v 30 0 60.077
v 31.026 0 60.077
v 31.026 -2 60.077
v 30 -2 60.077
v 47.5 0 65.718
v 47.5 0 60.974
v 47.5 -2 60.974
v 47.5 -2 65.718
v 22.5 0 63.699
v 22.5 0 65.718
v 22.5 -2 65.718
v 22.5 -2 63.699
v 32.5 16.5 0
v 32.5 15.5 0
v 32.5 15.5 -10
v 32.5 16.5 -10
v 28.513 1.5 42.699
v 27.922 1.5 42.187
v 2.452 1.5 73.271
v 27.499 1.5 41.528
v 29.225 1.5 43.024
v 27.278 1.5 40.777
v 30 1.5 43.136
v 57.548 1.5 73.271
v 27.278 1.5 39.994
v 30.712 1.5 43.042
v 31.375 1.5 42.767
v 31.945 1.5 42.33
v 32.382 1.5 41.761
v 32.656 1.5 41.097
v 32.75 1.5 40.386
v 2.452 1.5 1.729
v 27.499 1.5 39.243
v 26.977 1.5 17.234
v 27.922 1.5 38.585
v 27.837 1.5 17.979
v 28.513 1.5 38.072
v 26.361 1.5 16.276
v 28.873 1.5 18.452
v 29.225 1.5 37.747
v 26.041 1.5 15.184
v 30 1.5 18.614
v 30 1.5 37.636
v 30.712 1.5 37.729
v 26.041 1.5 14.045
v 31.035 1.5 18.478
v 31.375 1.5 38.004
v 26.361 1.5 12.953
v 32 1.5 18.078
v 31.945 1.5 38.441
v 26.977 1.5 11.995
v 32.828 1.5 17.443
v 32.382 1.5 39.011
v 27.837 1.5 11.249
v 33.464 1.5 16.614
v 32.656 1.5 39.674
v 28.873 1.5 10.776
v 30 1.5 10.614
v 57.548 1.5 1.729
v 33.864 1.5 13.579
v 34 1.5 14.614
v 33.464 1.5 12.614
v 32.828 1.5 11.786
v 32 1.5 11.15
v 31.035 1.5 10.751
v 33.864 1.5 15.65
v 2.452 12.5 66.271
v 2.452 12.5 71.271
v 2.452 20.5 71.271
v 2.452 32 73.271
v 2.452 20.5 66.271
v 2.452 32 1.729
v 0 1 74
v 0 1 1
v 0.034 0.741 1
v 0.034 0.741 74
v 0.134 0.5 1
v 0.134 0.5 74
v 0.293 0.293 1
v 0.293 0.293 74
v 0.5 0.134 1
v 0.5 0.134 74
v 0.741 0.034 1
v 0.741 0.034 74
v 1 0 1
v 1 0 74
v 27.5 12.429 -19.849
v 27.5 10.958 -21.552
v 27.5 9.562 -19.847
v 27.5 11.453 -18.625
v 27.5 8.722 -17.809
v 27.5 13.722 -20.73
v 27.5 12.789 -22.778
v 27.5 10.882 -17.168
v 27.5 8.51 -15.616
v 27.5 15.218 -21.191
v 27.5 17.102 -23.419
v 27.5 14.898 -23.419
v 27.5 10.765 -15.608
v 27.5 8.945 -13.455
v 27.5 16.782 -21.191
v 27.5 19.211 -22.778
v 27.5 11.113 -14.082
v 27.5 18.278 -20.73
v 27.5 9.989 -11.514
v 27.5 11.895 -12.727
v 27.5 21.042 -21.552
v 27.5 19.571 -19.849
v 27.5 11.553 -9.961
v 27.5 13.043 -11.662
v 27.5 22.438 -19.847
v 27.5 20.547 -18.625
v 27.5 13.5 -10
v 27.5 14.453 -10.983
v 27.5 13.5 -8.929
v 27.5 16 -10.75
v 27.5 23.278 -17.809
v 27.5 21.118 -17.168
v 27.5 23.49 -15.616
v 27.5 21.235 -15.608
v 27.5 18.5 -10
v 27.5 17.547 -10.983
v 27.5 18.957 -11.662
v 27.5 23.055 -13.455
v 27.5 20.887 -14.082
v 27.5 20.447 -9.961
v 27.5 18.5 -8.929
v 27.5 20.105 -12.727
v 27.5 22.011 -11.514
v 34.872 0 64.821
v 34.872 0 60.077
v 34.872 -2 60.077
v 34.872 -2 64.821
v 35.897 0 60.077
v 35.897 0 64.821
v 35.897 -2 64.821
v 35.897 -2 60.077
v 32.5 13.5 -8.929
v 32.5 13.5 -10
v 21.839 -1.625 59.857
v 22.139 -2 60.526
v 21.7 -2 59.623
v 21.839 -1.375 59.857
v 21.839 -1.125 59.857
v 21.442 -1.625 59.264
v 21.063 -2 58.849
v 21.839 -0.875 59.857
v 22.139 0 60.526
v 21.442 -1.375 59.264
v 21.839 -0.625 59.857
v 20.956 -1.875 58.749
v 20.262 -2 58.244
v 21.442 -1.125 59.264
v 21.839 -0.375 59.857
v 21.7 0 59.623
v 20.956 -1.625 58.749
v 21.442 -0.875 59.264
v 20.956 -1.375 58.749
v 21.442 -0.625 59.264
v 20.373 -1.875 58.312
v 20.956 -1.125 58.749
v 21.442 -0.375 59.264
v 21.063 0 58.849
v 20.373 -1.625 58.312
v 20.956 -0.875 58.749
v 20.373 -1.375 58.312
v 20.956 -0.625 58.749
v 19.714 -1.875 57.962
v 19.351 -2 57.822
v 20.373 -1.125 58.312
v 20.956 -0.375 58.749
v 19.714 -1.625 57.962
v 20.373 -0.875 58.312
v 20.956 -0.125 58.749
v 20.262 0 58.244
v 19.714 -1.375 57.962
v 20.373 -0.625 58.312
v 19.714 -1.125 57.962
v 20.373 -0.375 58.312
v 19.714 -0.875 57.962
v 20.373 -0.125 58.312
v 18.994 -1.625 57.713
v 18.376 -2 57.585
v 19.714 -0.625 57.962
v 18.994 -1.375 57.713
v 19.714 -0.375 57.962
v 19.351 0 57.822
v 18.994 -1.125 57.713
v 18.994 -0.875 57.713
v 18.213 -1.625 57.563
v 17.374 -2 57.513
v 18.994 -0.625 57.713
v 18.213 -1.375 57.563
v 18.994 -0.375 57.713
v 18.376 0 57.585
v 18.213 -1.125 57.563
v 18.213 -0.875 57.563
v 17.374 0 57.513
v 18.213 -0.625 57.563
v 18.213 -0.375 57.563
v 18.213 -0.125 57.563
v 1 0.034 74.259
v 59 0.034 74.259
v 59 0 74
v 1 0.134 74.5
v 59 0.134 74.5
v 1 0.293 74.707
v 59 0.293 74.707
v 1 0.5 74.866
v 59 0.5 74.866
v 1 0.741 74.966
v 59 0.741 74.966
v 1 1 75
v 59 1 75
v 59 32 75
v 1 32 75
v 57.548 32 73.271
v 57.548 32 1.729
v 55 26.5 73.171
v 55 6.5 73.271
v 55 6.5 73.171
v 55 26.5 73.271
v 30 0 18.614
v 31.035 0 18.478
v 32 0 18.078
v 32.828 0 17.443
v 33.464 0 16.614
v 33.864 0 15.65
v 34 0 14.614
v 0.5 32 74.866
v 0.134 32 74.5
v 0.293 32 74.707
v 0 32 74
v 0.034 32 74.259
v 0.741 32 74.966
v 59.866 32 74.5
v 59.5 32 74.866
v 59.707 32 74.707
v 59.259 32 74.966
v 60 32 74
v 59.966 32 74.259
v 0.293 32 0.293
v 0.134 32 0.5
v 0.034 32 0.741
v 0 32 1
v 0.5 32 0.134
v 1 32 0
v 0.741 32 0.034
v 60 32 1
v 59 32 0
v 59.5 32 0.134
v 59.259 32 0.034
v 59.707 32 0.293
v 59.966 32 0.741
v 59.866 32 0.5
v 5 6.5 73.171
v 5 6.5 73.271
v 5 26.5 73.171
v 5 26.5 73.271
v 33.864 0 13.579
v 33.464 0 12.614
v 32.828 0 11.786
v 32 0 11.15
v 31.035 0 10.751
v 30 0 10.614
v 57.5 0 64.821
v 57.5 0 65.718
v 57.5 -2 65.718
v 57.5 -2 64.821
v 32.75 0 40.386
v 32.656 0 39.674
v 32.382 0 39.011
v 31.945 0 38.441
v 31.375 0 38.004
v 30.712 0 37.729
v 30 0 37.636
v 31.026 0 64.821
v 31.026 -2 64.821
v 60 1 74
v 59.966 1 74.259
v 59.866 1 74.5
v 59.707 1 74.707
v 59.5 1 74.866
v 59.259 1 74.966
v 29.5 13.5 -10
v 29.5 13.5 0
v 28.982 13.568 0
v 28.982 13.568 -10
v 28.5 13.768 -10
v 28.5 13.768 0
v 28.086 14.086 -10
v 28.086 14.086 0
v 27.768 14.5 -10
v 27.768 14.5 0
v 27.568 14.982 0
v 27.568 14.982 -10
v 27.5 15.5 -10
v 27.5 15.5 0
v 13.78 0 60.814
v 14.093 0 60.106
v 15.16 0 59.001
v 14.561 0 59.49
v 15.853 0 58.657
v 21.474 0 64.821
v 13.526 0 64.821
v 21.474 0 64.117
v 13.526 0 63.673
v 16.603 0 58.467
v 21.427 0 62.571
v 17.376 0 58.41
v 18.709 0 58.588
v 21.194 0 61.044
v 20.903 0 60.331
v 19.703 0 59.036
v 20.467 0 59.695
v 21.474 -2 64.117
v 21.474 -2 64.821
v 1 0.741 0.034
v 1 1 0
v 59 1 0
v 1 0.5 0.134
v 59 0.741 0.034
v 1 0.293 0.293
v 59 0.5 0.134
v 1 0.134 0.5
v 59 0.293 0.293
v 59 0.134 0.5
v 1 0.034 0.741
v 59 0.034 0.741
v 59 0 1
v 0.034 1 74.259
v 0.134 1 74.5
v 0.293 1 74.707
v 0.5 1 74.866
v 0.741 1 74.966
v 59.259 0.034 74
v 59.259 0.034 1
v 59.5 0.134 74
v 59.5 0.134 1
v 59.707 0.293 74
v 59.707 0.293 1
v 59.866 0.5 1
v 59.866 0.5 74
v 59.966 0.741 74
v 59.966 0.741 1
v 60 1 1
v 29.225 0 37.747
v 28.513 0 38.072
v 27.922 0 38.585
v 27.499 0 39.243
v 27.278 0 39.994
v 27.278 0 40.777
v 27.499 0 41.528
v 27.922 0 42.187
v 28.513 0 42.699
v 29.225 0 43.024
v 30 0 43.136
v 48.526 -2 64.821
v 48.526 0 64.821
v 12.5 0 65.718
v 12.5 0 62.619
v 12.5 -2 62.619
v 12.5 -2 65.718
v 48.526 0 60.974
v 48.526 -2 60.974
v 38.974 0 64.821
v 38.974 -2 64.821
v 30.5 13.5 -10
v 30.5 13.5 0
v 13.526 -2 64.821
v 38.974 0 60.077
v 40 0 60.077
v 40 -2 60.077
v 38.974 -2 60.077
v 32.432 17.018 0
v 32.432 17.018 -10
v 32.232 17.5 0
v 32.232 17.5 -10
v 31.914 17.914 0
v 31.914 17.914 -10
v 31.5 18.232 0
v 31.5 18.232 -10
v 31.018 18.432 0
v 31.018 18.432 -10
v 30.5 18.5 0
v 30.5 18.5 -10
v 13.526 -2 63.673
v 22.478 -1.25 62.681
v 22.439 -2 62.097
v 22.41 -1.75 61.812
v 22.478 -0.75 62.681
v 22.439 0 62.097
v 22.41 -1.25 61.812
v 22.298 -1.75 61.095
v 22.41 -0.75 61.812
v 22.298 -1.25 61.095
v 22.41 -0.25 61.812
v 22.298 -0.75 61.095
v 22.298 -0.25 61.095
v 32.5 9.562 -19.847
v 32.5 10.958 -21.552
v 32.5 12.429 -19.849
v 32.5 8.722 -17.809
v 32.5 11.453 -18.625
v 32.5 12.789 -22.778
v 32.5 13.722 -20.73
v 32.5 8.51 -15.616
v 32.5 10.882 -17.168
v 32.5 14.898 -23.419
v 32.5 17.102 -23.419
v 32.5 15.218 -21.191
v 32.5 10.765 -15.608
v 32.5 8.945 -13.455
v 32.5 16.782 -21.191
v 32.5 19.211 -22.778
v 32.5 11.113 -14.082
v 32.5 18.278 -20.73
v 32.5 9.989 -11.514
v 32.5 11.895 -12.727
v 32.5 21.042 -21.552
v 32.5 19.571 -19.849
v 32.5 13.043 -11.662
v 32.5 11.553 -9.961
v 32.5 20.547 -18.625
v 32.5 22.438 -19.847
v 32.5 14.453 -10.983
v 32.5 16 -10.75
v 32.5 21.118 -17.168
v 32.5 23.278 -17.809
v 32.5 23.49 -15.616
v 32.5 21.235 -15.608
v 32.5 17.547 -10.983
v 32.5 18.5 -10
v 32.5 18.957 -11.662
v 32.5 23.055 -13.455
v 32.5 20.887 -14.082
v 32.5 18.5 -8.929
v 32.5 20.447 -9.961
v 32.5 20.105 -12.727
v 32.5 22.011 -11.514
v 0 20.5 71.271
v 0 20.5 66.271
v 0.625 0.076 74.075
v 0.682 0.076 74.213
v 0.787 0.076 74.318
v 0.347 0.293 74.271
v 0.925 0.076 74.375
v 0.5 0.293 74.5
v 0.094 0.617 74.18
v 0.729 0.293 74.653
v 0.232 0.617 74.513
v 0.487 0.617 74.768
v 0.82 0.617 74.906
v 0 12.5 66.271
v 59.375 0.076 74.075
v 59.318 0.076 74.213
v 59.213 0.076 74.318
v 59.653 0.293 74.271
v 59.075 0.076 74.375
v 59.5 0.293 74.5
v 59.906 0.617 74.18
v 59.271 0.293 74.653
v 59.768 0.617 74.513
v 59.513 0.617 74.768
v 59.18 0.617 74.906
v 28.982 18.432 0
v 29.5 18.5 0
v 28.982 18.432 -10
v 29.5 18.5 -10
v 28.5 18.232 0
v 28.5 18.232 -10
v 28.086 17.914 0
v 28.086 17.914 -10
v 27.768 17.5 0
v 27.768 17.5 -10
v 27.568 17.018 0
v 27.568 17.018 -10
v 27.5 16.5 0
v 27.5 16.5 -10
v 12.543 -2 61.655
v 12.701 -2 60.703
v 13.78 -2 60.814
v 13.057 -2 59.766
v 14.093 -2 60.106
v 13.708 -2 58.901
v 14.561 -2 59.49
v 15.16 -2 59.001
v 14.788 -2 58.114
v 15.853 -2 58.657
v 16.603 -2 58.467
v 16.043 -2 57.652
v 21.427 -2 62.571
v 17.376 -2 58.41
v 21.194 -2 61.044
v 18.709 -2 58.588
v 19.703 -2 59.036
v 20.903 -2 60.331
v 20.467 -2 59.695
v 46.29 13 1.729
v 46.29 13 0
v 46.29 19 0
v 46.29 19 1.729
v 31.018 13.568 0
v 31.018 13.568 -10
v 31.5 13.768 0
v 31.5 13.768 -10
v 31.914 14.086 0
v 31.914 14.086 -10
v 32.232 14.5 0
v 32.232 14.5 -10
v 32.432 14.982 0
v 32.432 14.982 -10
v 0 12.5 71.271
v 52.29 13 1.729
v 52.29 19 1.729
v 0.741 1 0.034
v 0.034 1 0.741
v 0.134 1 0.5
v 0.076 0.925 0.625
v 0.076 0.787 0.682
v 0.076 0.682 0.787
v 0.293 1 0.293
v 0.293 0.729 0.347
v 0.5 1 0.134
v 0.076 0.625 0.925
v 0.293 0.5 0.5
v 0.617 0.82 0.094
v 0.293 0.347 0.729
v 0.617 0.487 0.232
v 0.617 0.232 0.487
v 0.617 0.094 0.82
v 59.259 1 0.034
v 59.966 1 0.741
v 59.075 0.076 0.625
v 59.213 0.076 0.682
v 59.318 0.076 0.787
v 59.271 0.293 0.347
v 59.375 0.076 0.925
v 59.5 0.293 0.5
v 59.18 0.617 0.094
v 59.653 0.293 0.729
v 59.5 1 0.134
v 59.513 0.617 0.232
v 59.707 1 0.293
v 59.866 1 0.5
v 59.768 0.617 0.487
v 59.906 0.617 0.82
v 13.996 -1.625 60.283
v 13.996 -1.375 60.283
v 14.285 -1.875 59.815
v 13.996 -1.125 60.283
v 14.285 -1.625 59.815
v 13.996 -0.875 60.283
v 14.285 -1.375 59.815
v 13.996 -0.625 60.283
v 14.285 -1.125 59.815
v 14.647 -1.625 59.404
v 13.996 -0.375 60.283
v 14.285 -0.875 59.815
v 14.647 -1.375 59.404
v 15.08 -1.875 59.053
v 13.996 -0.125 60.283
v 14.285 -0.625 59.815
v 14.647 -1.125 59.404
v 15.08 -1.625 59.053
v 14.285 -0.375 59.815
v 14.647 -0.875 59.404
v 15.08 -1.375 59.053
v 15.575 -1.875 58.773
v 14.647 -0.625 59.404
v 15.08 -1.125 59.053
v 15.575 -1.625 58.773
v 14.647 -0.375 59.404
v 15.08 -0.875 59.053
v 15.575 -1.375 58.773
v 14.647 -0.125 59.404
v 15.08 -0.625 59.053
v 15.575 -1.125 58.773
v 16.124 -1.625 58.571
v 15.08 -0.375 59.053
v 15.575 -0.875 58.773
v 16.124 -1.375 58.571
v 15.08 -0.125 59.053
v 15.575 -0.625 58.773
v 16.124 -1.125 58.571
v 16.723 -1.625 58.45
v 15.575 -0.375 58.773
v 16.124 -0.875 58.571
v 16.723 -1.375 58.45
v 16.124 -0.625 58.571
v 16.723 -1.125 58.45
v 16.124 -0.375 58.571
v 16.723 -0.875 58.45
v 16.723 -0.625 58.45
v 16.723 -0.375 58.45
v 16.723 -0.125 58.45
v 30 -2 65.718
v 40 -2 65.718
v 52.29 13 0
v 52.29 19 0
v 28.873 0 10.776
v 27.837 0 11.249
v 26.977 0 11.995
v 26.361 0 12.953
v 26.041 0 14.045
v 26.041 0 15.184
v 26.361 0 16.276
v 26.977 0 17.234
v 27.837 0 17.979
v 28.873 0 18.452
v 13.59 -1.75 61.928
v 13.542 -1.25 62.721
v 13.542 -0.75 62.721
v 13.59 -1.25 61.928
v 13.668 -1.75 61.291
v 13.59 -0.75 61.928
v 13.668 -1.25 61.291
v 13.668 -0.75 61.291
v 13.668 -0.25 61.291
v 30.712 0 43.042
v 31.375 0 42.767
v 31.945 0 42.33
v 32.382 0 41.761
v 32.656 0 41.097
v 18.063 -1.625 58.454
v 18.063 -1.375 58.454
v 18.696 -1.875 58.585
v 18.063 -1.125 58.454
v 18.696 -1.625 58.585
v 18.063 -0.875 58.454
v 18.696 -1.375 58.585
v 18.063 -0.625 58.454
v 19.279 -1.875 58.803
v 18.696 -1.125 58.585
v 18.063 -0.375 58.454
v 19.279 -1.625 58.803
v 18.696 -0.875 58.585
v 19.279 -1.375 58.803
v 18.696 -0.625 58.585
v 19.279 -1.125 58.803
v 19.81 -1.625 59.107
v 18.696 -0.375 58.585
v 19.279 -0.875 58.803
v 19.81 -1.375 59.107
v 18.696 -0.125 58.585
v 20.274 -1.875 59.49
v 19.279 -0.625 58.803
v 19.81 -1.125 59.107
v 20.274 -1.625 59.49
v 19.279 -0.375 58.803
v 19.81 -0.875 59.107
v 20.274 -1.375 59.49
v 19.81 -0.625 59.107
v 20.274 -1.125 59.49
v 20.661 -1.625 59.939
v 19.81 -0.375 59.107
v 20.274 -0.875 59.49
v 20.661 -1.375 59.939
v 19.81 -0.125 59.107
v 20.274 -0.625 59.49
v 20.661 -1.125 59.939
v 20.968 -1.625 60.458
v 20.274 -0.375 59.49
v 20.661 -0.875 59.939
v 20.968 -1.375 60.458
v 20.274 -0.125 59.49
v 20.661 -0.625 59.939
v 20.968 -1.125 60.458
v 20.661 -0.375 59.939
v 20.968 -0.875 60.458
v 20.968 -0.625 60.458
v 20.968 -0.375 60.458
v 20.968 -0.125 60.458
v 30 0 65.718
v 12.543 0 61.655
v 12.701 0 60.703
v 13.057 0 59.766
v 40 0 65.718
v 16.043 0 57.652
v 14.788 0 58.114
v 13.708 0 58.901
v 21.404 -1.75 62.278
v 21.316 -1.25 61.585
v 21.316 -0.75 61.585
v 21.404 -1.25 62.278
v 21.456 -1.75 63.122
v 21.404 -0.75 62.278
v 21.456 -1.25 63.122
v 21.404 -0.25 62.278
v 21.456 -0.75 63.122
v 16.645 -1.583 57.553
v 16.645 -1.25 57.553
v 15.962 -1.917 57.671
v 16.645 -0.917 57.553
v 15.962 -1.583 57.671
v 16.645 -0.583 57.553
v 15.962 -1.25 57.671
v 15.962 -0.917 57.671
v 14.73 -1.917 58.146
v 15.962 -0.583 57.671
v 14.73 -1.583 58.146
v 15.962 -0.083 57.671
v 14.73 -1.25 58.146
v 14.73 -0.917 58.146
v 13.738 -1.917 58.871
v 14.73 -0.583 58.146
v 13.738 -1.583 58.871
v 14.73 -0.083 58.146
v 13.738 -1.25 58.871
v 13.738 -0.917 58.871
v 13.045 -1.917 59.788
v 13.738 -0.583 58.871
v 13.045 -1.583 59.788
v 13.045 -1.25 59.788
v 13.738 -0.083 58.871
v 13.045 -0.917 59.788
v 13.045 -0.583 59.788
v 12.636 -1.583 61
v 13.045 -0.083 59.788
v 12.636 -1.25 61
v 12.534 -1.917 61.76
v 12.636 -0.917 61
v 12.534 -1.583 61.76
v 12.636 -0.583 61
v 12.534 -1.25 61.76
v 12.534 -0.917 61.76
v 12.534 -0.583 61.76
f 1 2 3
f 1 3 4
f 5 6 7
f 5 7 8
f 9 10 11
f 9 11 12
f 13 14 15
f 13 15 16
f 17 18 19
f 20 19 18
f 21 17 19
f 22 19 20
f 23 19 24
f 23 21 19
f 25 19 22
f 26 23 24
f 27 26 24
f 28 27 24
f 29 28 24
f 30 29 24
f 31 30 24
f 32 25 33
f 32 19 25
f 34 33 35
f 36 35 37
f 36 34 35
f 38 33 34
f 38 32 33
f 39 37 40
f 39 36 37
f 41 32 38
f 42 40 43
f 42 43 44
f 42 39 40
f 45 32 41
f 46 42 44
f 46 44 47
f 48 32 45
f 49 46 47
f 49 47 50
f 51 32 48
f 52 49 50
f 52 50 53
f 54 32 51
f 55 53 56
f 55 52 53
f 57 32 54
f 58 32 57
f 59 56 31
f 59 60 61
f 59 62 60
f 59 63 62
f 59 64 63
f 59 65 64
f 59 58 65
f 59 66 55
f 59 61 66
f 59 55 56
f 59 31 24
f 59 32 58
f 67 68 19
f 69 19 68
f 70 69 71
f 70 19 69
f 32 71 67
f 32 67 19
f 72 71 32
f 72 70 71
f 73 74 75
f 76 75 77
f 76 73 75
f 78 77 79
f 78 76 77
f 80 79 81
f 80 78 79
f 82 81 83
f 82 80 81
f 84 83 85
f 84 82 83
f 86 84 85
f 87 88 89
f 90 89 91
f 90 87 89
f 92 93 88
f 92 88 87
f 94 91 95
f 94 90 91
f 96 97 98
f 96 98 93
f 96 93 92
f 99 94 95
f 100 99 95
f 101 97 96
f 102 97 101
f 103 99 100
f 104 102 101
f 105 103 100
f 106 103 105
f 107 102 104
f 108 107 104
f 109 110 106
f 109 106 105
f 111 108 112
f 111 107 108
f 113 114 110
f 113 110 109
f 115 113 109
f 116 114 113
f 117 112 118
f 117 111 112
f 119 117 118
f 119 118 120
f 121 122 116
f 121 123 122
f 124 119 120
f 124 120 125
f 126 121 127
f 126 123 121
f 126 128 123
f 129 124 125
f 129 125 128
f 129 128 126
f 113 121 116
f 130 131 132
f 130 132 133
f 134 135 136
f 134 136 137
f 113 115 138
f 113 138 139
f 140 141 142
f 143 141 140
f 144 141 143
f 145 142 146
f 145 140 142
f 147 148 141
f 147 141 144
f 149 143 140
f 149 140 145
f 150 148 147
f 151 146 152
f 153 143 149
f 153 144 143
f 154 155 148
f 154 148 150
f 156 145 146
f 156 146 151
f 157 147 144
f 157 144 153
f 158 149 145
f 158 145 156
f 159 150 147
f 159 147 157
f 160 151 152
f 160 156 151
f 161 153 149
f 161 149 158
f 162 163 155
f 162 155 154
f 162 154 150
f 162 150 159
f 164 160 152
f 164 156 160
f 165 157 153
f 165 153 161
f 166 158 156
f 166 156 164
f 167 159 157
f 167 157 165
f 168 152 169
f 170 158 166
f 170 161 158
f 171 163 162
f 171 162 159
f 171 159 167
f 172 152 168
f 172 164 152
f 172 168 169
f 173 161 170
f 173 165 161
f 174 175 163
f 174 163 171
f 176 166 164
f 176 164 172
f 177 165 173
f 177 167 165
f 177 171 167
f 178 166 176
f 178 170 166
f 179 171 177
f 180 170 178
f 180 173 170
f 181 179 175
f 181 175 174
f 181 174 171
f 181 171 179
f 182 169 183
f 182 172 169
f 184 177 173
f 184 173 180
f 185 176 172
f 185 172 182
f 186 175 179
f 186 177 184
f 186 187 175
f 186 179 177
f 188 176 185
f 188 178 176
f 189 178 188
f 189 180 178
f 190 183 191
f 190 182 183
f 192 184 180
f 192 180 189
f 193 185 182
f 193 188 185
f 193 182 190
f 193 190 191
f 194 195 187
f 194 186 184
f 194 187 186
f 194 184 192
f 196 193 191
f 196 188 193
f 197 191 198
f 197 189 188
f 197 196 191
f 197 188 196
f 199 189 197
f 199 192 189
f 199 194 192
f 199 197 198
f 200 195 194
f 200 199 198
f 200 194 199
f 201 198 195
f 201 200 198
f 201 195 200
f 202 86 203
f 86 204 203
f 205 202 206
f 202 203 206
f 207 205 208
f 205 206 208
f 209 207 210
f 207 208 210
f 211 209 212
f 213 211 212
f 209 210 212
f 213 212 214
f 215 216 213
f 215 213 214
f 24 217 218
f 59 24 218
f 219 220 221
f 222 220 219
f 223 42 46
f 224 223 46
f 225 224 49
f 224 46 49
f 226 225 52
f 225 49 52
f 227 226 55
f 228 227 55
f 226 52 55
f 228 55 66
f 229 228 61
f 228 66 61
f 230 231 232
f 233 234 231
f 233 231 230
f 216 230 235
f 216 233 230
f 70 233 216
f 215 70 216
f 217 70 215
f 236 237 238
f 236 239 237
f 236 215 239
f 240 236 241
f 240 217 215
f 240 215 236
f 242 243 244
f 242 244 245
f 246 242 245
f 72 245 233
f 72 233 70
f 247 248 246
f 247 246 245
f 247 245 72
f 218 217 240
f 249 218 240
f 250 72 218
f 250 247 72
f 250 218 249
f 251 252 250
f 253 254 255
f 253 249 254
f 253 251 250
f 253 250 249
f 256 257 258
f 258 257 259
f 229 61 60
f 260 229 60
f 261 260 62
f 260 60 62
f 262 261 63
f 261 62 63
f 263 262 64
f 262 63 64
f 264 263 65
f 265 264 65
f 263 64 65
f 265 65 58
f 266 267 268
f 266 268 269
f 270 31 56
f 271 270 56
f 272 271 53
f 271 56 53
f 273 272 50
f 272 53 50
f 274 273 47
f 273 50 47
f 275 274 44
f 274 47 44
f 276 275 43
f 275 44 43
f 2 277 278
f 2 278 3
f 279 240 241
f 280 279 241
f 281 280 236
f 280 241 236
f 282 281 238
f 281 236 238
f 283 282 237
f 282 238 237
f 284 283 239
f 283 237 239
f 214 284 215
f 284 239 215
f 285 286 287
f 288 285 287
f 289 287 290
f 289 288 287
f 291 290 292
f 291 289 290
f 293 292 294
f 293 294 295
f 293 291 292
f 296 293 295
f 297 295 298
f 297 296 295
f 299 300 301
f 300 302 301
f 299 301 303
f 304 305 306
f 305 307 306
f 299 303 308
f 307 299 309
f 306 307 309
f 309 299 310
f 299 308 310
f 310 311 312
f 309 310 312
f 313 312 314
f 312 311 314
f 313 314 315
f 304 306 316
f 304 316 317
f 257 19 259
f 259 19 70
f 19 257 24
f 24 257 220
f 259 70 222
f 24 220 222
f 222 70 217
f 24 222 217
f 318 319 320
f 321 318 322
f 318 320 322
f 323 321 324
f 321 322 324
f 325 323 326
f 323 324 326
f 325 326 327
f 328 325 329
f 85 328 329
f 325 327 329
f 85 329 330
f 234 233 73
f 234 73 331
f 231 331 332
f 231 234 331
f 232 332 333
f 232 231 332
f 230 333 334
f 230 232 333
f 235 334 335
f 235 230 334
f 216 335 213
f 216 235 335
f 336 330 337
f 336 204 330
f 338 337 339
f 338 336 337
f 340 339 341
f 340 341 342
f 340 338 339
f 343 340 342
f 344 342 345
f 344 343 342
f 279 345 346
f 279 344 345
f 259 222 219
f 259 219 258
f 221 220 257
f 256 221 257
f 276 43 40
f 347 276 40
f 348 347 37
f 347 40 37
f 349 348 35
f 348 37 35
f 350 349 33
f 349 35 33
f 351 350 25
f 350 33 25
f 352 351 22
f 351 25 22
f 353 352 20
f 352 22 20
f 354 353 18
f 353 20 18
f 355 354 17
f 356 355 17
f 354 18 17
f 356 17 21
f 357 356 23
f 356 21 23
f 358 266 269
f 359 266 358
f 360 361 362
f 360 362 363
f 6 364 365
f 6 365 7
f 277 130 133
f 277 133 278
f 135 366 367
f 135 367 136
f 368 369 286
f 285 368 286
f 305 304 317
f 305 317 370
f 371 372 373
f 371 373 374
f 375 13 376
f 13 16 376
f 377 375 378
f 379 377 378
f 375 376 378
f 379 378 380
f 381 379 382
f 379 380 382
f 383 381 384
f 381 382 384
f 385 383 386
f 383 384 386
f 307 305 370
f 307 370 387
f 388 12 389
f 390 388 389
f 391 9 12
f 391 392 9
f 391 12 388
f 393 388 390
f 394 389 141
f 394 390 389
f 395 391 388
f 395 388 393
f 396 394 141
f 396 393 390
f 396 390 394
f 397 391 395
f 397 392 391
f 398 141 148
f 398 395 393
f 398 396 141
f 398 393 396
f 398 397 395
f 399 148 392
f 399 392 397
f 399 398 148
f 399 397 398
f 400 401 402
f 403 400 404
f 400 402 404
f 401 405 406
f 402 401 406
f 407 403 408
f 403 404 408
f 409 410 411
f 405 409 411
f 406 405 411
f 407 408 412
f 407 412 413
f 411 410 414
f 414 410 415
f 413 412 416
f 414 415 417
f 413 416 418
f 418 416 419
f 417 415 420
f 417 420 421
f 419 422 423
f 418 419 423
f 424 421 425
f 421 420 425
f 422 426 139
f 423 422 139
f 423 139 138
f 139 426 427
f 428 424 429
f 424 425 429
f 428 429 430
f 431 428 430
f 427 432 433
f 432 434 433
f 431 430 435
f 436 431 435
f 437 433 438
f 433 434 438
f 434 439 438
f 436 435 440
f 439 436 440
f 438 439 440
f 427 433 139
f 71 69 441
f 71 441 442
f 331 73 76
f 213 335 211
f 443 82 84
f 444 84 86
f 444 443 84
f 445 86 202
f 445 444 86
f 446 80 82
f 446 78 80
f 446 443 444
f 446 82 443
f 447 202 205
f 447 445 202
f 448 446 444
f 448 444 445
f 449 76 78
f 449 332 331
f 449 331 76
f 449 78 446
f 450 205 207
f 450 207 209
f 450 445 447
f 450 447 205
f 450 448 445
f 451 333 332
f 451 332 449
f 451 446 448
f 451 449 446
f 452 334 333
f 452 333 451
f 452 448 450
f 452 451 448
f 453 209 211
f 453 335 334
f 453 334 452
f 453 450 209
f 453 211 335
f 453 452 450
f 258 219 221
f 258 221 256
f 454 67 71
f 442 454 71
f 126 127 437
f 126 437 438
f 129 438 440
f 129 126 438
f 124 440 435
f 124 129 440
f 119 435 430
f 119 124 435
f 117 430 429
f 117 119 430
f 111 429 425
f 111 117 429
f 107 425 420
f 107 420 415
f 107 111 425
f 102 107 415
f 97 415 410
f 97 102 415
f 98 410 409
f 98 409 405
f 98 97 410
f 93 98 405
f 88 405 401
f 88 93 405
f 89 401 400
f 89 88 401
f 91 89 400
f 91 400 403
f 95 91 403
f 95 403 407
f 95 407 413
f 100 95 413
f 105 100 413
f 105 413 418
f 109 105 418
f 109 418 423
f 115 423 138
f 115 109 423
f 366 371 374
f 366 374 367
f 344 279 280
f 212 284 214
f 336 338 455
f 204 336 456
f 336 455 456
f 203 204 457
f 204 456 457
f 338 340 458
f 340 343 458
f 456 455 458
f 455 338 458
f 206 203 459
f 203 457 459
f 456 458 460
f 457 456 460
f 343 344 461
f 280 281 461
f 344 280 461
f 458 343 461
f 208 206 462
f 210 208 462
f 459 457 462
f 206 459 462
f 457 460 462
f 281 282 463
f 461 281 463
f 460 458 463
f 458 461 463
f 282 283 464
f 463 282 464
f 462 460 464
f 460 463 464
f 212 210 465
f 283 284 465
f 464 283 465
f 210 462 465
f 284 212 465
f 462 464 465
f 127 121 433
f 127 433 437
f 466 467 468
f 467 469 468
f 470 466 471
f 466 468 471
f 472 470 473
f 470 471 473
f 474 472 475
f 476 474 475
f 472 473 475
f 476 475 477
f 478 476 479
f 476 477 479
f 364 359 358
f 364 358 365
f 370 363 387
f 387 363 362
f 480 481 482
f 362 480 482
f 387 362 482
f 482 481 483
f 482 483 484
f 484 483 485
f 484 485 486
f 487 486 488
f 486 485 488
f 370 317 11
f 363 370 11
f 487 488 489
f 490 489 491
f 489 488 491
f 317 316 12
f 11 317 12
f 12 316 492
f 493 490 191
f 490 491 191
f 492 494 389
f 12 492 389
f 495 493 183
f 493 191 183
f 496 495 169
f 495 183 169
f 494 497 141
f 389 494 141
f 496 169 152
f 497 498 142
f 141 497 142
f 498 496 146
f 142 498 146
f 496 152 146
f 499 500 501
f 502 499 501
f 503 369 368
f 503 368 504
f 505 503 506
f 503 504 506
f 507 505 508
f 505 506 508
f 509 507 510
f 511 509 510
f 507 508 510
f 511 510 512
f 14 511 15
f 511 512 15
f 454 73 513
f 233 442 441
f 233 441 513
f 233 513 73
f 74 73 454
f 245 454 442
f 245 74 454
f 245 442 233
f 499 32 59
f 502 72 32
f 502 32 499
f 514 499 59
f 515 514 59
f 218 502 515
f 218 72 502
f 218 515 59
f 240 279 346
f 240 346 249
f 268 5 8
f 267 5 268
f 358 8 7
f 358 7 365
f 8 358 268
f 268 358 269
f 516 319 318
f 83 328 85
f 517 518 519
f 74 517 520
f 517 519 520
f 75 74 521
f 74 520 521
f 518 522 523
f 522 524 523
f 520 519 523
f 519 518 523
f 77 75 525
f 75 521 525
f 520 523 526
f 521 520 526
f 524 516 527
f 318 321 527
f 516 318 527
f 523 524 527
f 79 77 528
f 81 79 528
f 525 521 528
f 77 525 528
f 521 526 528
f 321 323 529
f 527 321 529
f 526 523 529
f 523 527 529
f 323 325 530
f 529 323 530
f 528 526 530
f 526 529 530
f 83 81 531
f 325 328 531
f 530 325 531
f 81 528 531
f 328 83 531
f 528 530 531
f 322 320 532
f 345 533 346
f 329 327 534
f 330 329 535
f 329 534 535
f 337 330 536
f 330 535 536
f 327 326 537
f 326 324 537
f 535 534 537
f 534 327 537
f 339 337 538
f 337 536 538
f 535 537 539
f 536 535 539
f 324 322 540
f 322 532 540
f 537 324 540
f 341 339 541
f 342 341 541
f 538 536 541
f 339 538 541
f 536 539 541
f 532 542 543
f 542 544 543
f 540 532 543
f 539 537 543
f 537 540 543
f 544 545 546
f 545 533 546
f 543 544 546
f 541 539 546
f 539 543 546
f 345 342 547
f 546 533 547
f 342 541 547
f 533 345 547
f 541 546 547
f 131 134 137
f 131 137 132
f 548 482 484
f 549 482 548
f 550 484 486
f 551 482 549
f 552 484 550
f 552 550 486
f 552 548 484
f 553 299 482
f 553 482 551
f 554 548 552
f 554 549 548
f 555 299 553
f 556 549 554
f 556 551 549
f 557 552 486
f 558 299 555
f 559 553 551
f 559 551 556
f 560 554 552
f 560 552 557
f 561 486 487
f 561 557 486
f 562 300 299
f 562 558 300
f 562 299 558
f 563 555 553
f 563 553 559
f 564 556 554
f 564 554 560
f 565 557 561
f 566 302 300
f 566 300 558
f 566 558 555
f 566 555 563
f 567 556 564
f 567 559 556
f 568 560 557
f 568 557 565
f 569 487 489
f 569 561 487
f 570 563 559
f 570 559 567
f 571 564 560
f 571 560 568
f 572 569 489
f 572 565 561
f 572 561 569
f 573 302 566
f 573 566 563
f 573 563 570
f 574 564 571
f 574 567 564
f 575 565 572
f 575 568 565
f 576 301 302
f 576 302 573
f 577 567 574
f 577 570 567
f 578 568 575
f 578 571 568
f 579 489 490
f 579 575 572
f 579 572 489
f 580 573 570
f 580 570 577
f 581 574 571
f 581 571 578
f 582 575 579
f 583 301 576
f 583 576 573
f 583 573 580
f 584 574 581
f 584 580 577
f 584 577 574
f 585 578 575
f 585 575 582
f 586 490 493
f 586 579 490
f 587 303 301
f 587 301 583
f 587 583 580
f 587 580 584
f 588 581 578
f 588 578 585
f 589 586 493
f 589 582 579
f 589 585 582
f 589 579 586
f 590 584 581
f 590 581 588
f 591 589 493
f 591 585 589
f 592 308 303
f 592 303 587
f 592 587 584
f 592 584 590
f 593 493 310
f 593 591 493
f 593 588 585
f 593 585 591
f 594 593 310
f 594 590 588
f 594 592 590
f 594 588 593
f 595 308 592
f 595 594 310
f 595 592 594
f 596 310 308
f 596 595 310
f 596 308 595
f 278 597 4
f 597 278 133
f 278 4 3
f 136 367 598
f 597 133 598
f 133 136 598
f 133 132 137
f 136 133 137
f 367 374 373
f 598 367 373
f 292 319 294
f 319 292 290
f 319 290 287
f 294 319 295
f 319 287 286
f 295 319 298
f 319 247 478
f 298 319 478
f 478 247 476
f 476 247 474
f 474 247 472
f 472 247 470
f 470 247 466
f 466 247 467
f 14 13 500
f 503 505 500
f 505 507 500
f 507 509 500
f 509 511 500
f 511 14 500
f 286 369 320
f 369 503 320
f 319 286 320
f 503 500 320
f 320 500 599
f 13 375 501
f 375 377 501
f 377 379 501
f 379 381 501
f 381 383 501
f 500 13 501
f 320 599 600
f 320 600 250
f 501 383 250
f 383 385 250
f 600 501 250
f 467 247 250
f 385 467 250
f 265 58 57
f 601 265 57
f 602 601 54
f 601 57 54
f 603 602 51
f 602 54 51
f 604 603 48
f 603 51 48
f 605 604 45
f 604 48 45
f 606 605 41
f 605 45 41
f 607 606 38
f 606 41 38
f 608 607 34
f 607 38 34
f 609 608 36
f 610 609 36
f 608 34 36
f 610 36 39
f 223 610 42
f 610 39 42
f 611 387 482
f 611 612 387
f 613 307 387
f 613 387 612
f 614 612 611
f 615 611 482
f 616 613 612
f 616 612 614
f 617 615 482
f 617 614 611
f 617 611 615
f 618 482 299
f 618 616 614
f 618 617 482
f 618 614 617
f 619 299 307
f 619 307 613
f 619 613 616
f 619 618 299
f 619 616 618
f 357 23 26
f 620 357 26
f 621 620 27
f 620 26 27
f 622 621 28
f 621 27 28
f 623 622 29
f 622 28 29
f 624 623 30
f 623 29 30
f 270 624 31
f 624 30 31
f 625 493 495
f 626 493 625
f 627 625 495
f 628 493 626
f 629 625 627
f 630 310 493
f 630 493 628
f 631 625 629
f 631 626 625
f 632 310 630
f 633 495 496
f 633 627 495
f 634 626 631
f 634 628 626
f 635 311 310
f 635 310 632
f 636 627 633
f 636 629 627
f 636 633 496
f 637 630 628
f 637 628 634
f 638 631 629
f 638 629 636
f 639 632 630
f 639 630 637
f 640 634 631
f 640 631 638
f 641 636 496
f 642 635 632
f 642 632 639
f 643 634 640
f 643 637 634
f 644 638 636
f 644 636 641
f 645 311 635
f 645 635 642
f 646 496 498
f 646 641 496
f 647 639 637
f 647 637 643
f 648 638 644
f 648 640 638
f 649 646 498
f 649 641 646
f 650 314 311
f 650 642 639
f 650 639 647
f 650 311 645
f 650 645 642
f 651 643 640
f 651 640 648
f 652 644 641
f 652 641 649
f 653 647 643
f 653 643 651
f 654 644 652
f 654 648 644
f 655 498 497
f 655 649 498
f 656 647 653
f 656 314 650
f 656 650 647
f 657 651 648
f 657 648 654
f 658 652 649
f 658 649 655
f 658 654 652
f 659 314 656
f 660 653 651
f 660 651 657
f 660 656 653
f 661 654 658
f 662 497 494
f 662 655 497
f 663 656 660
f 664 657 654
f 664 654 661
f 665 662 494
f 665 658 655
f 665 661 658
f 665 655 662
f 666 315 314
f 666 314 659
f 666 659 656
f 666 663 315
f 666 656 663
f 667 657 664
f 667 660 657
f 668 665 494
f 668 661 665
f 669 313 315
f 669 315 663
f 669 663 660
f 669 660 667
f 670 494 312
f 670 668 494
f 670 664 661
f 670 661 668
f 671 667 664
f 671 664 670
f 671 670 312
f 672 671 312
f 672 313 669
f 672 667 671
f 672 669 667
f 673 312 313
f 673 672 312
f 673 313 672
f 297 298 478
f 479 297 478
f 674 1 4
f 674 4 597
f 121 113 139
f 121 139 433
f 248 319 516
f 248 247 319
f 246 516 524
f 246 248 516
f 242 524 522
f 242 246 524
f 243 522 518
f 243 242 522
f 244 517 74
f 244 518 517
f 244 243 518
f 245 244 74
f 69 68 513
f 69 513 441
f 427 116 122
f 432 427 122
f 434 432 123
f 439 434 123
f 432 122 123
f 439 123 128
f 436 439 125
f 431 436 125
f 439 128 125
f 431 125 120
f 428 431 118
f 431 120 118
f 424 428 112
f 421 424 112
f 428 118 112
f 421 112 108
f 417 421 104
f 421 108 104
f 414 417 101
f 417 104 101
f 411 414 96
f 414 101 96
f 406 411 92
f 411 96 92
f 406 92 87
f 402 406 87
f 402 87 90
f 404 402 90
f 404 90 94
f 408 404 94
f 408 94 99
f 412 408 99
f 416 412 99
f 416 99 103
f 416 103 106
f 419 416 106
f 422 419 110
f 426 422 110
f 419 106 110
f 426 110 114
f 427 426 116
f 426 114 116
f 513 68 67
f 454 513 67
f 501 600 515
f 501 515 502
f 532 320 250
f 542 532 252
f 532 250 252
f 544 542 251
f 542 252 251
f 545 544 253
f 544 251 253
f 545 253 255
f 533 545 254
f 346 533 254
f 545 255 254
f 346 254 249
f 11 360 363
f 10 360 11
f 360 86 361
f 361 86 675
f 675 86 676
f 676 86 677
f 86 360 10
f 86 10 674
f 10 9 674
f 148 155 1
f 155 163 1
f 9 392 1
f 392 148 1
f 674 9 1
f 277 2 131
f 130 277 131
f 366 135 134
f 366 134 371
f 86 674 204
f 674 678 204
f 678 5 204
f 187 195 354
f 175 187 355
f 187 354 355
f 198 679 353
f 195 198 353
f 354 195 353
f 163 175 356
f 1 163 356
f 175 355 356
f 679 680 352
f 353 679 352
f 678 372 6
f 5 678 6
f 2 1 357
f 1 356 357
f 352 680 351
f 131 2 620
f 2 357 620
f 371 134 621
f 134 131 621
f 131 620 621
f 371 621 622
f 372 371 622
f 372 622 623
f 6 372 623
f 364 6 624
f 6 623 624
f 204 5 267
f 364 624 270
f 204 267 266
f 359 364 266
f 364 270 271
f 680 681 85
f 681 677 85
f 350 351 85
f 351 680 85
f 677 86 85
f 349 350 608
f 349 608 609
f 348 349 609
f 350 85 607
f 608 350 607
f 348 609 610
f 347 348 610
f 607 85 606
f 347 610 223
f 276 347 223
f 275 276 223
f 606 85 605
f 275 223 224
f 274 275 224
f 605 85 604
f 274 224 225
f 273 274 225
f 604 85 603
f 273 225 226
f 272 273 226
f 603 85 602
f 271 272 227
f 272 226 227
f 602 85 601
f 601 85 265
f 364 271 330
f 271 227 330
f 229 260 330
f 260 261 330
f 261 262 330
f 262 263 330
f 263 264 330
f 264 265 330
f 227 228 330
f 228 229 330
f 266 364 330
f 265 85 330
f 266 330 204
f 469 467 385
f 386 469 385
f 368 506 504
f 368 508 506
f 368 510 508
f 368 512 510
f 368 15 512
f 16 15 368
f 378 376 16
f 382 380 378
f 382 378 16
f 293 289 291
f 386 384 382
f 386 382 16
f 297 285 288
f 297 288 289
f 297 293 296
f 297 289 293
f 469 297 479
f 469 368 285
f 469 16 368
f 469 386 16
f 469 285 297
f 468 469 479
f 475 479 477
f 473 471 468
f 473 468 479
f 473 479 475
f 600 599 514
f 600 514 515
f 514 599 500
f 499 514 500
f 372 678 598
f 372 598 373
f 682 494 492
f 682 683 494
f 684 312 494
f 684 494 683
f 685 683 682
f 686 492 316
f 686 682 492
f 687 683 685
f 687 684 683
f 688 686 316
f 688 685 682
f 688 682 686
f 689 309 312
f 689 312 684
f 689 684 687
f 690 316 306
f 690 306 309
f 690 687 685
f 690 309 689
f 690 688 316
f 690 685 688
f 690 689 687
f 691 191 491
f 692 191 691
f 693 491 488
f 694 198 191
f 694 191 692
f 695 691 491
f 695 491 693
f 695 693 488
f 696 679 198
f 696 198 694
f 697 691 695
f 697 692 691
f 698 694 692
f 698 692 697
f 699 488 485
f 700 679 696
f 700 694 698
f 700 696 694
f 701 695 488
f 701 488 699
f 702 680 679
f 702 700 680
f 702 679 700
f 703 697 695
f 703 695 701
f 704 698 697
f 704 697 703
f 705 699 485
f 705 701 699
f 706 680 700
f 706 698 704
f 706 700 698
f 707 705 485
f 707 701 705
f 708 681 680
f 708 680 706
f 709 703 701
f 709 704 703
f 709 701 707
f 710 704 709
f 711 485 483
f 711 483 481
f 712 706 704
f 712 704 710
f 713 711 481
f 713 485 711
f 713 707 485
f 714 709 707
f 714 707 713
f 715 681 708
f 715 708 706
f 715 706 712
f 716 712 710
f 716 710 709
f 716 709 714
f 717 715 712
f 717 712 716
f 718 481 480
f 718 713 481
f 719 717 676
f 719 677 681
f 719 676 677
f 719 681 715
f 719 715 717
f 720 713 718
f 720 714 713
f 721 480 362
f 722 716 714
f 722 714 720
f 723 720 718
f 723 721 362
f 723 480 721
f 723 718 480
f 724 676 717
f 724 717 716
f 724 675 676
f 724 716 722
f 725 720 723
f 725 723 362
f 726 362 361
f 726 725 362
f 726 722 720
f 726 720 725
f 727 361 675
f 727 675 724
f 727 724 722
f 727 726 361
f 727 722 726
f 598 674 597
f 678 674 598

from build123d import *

# Parameters (mm, degrees)
SKETCH1_W           = 60
SKETCH1_H           = 32
BOSS_EXTRUDE1_DEPTH = 75
SKETCH2_W           = 55.096049088
SKETCH2_H           = 71.542939766
CUT_EXTRUDE1_DEPTH  = 30.5
SKETCH3_W           = 2.5
SKETCH3_H           = 5
BOSS_EXTRUDE2_DEPTH = 10
SKETCH4_R           = 5.25
BOSS_EXTRUDE3_DEPTH = 5
SKETCH8_W           = 50
SKETCH8_H           = 20
BOSS_EXTRUDE5_DEPTH = 0.1
CUT_EXTRUDE2_DEPTH  = 20
SKETCH10_W          = 5
SKETCH10_H          = 8
CUT_EXTRUDE3_DEPTH  = 20
FILLET2_R           = 2
FILLET4_R           = 1
SKETCH11_W          = 6
SKETCH11_H          = 6
CUT_EXTRUDE4_DEPTH  = 10
BOSS_EXTRUDE6_DEPTH = 2


with BuildPart() as part:
    # Sketch1 → Boss-Extrude1 (new body)
    with BuildSketch(Plane.XY):
        with Locations((30, 16)):
            Rectangle(SKETCH1_W, SKETCH1_H)
    extrude(amount=BOSS_EXTRUDE1_DEPTH)

    # Sketch2 → Cut-Extrude1 (cut)
    with BuildSketch(Plane(origin=(0, 32, 0), x_dir=(1, 0, 0), z_dir=(0, 1, 0))):
        with Locations((30, -37.5)):
            Rectangle(SKETCH2_W, SKETCH2_H)
    extrude(amount=-CUT_EXTRUDE1_DEPTH, mode=Mode.SUBTRACT)

    # Sketch3 → Boss-Extrude2 (add)
    with BuildSketch(Plane(origin=(0, 0, 0), x_dir=(-1, 0, 0), z_dir=(0, 0, -1))):
        with Locations((-28.75, 16)):
            Rectangle(SKETCH3_W, SKETCH3_H)
        with Locations((-31.25, 16)):
            Rectangle(SKETCH3_W, SKETCH3_H)
    extrude(amount=BOSS_EXTRUDE2_DEPTH)

    # Sketch8 → Boss-Extrude5 (add)
    with BuildSketch(Plane(origin=(0, 0, 73.271469883), x_dir=(-1, 0, 0), z_dir=(0, 0, -1))):
        with Locations((-30, 16.5)):
            Rectangle(SKETCH8_W, SKETCH8_H)
    extrude(amount=BOSS_EXTRUDE5_DEPTH)

    # Sketch9 → Cut-Extrude2 (cut)
    with BuildSketch(Plane(origin=(0, 1.5, 0), x_dir=(1, 0, 0), z_dir=(0, 1, 0))):
        with BuildLine():
            ThreePointArc((30, -37.635734942), (27.25, -40.385734942), (30, -43.135734942))
            Line((30, -43.135734942), (30, -37.635734942))
        make_face()
        with BuildLine():
            Line((30, -37.635734942), (30, -43.135734942))
            ThreePointArc((30, -43.135734942), (31.944543648, -42.33027859), (32.75, -40.385734942))
            ThreePointArc((32.75, -40.385734942), (31.944543648, -38.441191293), (30, -37.635734942))
        make_face()
        with BuildLine():
            ThreePointArc((30, -10.614265058), (26, -14.614265058), (30, -18.614265058))
            Line((30, -18.614265058), (30, -10.614265058))
        make_face()
        with BuildLine():
            Line((30, -10.614265058), (30, -18.614265058))
            ThreePointArc((30, -18.614265058), (32.828427125, -17.442692183), (34, -14.614265058))
            ThreePointArc((34, -14.614265058), (32.828427125, -11.785837934), (30, -10.614265058))
        make_face()
    extrude(amount=-CUT_EXTRUDE2_DEPTH, mode=Mode.SUBTRACT)

    # Sketch10 → Cut-Extrude3 (cut)
    with BuildSketch(Plane(origin=(2.451975456, 0, 0), x_dir=(0, 0, -1), z_dir=(1, 0, 0))):
        with Locations((-68.771469883, 16.5)):
            Rectangle(SKETCH10_W, SKETCH10_H)
    extrude(amount=-CUT_EXTRUDE3_DEPTH, mode=Mode.SUBTRACT)

    # Fillet2
    fillet2_edges = [part.edges().sort_by_distance(p)[0] for p in [
        (32.5, 13.5, -5),
        (27.5, 13.5, -5),
        (27.5, 18.5, -5),
        (32.5, 18.5, -5),
    ]]
    fillet(fillet2_edges, radius=FILLET2_R)

    # Fillet4
    fillet4_edges = [part.edges().sort_by_distance(p)[0] for p in [
        (60, 16, 75),
        (0, 16, 75),
        (60, 16, 0),
        (30, 0, 0),
        (0, 16, 0),
        (60, 0, 37.5),
        (0, 0, 37.5),
        (30, 0, 75),
    ]]
    fillet(fillet4_edges, radius=FILLET4_R)

    # Sketch11 → Cut-Extrude4 (cut)
    with BuildSketch(Plane(origin=(0, 0, 0), x_dir=(-1, 0, 0), z_dir=(0, 0, -1))):
        with Locations((-49.289598549, 16)):
            Rectangle(SKETCH11_W, SKETCH11_H)
    extrude(amount=-CUT_EXTRUDE4_DEPTH, mode=Mode.SUBTRACT)

    # Sketch12 → Boss-Extrude6 (add)
    # profile 1 of 3: a face of its own
    with BuildSketch(Plane(origin=(0, 0, 0), x_dir=(-1, 0, 0), z_dir=(0, -1, 0))):
        Polygon((-57.5, -65.717948718), (-57.5, -64.820512821), (-48.525641026, -64.820512821), (-48.525641026, -60.974358974), (-47.5, -60.974358974), (-47.5, -65.717948718), align=None)
    # profile 2 of 3: a face of its own
    with BuildSketch(Plane(origin=(0, 0, 0), x_dir=(-1, 0, 0), z_dir=(0, -1, 0))):
        Polygon((-40, -65.717948718), (-40, -60.076923077), (-38.974358974, -60.076923077), (-38.974358974, -64.820512821), (-35.897435897, -64.820512821), (-35.897435897, -60.076923077), (-34.871794872, -60.076923077), (-34.871794872, -64.820512821), (-31.025641026, -64.820512821), (-31.025641026, -60.076923077), (-30, -60.076923077), (-30, -65.717948718), align=None)
    # profile 3 of 3: a face of its own
    with BuildSketch(Plane(origin=(0, 0, 0), x_dir=(-1, 0, 0), z_dir=(0, -1, 0))):
        with BuildLine():
            Line((-12.5, -65.717948718), (-22.5, -65.717948718))
            Line((-22.5, -65.717948718), (-22.5, -63.698717949))
            add(Edge.make_bspline(
                [(-22.5, -63.698717949), (-22.498735514, -63.523092268), (-22.496292535, -63.183784367), (-22.480802846, -62.693463089), (-22.453401515, -62.239795196), (-22.413488583, -61.824272742), (-22.364479915, -61.445754993), (-22.303050189, -61.105301827), (-22.230512559, -60.801152847), (-22.168668415, -60.614097303), (-22.139423077, -60.525641026)],
                knots=[0, 0, 0, 0, 1.314313732, 2.53924729, 3.670748893, 4.714932338, 5.66265055, 6.526160246, 7.303039223, 8, 8, 8, 8], degree=3))
            add(Edge.make_bspline(
                [(-22.139423077, -60.525641026), (-22.095349076, -60.40993135), (-22.008200527, -60.181135911), (-21.843554638, -59.855552544), (-21.657769926, -59.548007707), (-21.446570967, -59.260953421), (-21.212715665, -58.993669435), (-20.957874681, -58.743122156), (-20.67638683, -58.515488829), (-20.373262431, -58.307224063), (-20.052385359, -58.119395673), (-19.71428113, -57.956144238), (-19.360690172, -57.820560503), (-18.992589457, -57.708008673), (-18.609171316, -57.61930444), (-18.209988819, -57.558784654), (-17.796619712, -57.518867535), (-17.516121244, -57.514855961), (-17.373798077, -57.512820513)],
                knots=[0, 0, 0, 0, 0.984741985, 1.947153288, 2.898543998, 3.841229145, 4.778974371, 5.722123648, 6.681464302, 7.655713756, 8.646344578, 9.637374342, 10.639946623, 11.656849581, 12.698333139, 13.76849723, 14.867749466, 16, 16, 16, 16], degree=3))
            add(Edge.make_bspline(
                [(-17.373798077, -57.512820513), (-17.25019454, -57.514617564), (-17.006620859, -57.518158841), (-16.647646855, -57.549956867), (-16.299322425, -57.596174997), (-15.963305925, -57.667729584), (-15.636654651, -57.754594866), (-15.32284539, -57.8659175), (-15.019016377, -57.993460367), (-14.729213759, -58.142126946), (-14.454829341, -58.305560099), (-14.195979143, -58.479856653), (-13.958407138, -58.66896952), (-13.735887862, -58.867301532), (-13.534365667, -59.079635436), (-13.350167074, -59.3033861), (-13.186375966, -59.539423077), (-13.040418525, -59.789207505), (-12.909892823, -60.056075317), (-12.801018728, -60.348420856), (-12.706722647, -60.664859341), (-12.631710109, -61.00719534), (-12.57121196, -61.374207846), (-12.530932059, -61.766914959), (-12.503614678, -62.184574518), (-12.501228288, -62.47137341), (-12.5, -62.618990385)],
                knots=[0, 0, 0, 0, 1.106010661, 2.179509527, 3.223302912, 4.248870533, 5.252098245, 6.246278179, 7.226402005, 8.199283979, 9.158616973, 10.083547221, 10.989831858, 11.874256832, 12.749262829, 13.607058236, 14.46581075, 15.317568432, 16.194266721, 17.121067875, 18.106207572, 19.147242834, 20.255495536, 21.43354536, 22.679031616, 24, 24, 24, 24], degree=3))
            Line((-12.5, -62.618990385), (-12.5, -65.717948718))
        make_face()
        with BuildLine():
            Line((-13.525641026, -64.820512821), (-13.525641026, -63.672676282))
            add(Edge.make_bspline(
                [(-13.525641026, -63.672676282), (-13.526349872, -63.50773808), (-13.527713244, -63.190501513), (-13.539676682, -62.734335807), (-13.559225075, -62.317537531), (-13.58658244, -61.940047504), (-13.622778483, -61.602078863), (-13.663135348, -61.302925292), (-13.713413779, -61.043567411), (-13.758987949, -60.886626163), (-13.780048077, -60.814102564)],
                knots=[0, 0, 0, 0, 1.375205317, 2.645023457, 3.804390687, 4.853969522, 5.800190428, 6.637939096, 7.370582563, 8, 8, 8, 8], degree=3))
            add(Edge.make_bspline(
                [(-13.780048077, -60.814102564), (-13.81219538, -60.72282152), (-13.875722149, -60.542439678), (-13.991601268, -60.282779572), (-14.128864005, -60.040616196), (-14.281443099, -59.811732258), (-14.454713028, -59.599363483), (-14.644932236, -59.401034788), (-14.852969787, -59.216988985), (-15.078488342, -59.050060878), (-15.319042421, -58.898862431), (-15.575057466, -58.769064907), (-15.842934289, -58.656028267), (-16.124841506, -58.566523719), (-16.418712888, -58.495953304), (-16.726072283, -58.446487389), (-17.046647714, -58.415778201), (-17.264887143, -58.412117076), (-17.375801282, -58.41025641)],
                knots=[0, 0, 0, 0, 0.998590647, 1.973329978, 2.929871262, 3.868367705, 4.809062953, 5.754642869, 6.701828697, 7.672172887, 8.647399344, 9.630604387, 10.631475358, 11.644913558, 12.679592956, 13.747988925, 14.855477812, 16, 16, 16, 16], degree=3))
            add(Edge.make_bspline(
                [(-17.375801282, -58.41025641), (-17.492754083, -58.411722946), (-17.722508895, -58.414603967), (-18.059625168, -58.450816283), (-18.383855598, -58.503735013), (-18.69522187, -58.58025983), (-18.994331448, -58.677776627), (-19.279530048, -58.799475603), (-19.553829674, -58.938523087), (-19.81089929, -59.103961192), (-20.054022459, -59.285148602), (-20.276750789, -59.486228257), (-20.479591647, -59.70400551), (-20.665703969, -59.93610508), (-20.827600186, -60.18906822), (-20.972419275, -60.456935908), (-21.095321821, -60.743637826), (-21.160690001, -60.943102671), (-21.193910256, -61.044471154)],
                knots=[0, 0, 0, 0, 1.122418816, 2.205001699, 3.251619955, 4.274784885, 5.280384055, 6.268708349, 7.249350384, 8.229342522, 9.199999885, 10.157847722, 11.105861043, 12.055065948, 13.010012805, 13.98527497, 14.976112212, 16, 16, 16, 16], degree=3))
            add(Edge.make_bspline(
                [(-21.193910256, -61.044471154), (-21.21710005, -61.128331572), (-21.266407915, -61.30664183), (-21.320194693, -61.597611727), (-21.367636119, -61.925083583), (-21.407801946, -62.2905113), (-21.436622864, -62.693478326), (-21.458255191, -63.134294578), (-21.47284557, -63.613150591), (-21.473841876, -63.945100687), (-21.474358974, -64.117387821)],
                knots=[0, 0, 0, 0, 0.674548936, 1.434276114, 2.292660221, 3.240891867, 4.284742987, 5.42552168, 6.663806718, 8, 8, 8, 8], degree=3))
            Line((-21.474358974, -64.117387821), (-21.474358974, -64.820512821))
            Line((-21.474358974, -64.820512821), (-13.525641026, -64.820512821))
        make_face(mode=Mode.SUBTRACT)
    extrude(amount=BOSS_EXTRUDE6_DEPTH)


with BuildPart() as body_2:
    # Sketch4 → Boss-Extrude3 (new body)
    with BuildSketch(Plane.ZY.offset(-27.5)):
        with BuildLine():
            Line((-10, 13.5), (-10, 16))
            Line((-10, 16), (-10, 18.5))
            Line((-10, 18.5), (-8.928932188, 18.5))
            ThreePointArc((-8.928932188, 18.5), (-23.5, 16), (-8.928932188, 13.5))
            Line((-8.928932188, 13.5), (-10, 13.5))
        make_face()
        with Locations((-16, 16)):
            Circle(SKETCH4_R, mode=Mode.SUBTRACT)
    extrude(amount=-BOSS_EXTRUDE3_DEPTH)


solid = Compound([part.part, body_2.part])
